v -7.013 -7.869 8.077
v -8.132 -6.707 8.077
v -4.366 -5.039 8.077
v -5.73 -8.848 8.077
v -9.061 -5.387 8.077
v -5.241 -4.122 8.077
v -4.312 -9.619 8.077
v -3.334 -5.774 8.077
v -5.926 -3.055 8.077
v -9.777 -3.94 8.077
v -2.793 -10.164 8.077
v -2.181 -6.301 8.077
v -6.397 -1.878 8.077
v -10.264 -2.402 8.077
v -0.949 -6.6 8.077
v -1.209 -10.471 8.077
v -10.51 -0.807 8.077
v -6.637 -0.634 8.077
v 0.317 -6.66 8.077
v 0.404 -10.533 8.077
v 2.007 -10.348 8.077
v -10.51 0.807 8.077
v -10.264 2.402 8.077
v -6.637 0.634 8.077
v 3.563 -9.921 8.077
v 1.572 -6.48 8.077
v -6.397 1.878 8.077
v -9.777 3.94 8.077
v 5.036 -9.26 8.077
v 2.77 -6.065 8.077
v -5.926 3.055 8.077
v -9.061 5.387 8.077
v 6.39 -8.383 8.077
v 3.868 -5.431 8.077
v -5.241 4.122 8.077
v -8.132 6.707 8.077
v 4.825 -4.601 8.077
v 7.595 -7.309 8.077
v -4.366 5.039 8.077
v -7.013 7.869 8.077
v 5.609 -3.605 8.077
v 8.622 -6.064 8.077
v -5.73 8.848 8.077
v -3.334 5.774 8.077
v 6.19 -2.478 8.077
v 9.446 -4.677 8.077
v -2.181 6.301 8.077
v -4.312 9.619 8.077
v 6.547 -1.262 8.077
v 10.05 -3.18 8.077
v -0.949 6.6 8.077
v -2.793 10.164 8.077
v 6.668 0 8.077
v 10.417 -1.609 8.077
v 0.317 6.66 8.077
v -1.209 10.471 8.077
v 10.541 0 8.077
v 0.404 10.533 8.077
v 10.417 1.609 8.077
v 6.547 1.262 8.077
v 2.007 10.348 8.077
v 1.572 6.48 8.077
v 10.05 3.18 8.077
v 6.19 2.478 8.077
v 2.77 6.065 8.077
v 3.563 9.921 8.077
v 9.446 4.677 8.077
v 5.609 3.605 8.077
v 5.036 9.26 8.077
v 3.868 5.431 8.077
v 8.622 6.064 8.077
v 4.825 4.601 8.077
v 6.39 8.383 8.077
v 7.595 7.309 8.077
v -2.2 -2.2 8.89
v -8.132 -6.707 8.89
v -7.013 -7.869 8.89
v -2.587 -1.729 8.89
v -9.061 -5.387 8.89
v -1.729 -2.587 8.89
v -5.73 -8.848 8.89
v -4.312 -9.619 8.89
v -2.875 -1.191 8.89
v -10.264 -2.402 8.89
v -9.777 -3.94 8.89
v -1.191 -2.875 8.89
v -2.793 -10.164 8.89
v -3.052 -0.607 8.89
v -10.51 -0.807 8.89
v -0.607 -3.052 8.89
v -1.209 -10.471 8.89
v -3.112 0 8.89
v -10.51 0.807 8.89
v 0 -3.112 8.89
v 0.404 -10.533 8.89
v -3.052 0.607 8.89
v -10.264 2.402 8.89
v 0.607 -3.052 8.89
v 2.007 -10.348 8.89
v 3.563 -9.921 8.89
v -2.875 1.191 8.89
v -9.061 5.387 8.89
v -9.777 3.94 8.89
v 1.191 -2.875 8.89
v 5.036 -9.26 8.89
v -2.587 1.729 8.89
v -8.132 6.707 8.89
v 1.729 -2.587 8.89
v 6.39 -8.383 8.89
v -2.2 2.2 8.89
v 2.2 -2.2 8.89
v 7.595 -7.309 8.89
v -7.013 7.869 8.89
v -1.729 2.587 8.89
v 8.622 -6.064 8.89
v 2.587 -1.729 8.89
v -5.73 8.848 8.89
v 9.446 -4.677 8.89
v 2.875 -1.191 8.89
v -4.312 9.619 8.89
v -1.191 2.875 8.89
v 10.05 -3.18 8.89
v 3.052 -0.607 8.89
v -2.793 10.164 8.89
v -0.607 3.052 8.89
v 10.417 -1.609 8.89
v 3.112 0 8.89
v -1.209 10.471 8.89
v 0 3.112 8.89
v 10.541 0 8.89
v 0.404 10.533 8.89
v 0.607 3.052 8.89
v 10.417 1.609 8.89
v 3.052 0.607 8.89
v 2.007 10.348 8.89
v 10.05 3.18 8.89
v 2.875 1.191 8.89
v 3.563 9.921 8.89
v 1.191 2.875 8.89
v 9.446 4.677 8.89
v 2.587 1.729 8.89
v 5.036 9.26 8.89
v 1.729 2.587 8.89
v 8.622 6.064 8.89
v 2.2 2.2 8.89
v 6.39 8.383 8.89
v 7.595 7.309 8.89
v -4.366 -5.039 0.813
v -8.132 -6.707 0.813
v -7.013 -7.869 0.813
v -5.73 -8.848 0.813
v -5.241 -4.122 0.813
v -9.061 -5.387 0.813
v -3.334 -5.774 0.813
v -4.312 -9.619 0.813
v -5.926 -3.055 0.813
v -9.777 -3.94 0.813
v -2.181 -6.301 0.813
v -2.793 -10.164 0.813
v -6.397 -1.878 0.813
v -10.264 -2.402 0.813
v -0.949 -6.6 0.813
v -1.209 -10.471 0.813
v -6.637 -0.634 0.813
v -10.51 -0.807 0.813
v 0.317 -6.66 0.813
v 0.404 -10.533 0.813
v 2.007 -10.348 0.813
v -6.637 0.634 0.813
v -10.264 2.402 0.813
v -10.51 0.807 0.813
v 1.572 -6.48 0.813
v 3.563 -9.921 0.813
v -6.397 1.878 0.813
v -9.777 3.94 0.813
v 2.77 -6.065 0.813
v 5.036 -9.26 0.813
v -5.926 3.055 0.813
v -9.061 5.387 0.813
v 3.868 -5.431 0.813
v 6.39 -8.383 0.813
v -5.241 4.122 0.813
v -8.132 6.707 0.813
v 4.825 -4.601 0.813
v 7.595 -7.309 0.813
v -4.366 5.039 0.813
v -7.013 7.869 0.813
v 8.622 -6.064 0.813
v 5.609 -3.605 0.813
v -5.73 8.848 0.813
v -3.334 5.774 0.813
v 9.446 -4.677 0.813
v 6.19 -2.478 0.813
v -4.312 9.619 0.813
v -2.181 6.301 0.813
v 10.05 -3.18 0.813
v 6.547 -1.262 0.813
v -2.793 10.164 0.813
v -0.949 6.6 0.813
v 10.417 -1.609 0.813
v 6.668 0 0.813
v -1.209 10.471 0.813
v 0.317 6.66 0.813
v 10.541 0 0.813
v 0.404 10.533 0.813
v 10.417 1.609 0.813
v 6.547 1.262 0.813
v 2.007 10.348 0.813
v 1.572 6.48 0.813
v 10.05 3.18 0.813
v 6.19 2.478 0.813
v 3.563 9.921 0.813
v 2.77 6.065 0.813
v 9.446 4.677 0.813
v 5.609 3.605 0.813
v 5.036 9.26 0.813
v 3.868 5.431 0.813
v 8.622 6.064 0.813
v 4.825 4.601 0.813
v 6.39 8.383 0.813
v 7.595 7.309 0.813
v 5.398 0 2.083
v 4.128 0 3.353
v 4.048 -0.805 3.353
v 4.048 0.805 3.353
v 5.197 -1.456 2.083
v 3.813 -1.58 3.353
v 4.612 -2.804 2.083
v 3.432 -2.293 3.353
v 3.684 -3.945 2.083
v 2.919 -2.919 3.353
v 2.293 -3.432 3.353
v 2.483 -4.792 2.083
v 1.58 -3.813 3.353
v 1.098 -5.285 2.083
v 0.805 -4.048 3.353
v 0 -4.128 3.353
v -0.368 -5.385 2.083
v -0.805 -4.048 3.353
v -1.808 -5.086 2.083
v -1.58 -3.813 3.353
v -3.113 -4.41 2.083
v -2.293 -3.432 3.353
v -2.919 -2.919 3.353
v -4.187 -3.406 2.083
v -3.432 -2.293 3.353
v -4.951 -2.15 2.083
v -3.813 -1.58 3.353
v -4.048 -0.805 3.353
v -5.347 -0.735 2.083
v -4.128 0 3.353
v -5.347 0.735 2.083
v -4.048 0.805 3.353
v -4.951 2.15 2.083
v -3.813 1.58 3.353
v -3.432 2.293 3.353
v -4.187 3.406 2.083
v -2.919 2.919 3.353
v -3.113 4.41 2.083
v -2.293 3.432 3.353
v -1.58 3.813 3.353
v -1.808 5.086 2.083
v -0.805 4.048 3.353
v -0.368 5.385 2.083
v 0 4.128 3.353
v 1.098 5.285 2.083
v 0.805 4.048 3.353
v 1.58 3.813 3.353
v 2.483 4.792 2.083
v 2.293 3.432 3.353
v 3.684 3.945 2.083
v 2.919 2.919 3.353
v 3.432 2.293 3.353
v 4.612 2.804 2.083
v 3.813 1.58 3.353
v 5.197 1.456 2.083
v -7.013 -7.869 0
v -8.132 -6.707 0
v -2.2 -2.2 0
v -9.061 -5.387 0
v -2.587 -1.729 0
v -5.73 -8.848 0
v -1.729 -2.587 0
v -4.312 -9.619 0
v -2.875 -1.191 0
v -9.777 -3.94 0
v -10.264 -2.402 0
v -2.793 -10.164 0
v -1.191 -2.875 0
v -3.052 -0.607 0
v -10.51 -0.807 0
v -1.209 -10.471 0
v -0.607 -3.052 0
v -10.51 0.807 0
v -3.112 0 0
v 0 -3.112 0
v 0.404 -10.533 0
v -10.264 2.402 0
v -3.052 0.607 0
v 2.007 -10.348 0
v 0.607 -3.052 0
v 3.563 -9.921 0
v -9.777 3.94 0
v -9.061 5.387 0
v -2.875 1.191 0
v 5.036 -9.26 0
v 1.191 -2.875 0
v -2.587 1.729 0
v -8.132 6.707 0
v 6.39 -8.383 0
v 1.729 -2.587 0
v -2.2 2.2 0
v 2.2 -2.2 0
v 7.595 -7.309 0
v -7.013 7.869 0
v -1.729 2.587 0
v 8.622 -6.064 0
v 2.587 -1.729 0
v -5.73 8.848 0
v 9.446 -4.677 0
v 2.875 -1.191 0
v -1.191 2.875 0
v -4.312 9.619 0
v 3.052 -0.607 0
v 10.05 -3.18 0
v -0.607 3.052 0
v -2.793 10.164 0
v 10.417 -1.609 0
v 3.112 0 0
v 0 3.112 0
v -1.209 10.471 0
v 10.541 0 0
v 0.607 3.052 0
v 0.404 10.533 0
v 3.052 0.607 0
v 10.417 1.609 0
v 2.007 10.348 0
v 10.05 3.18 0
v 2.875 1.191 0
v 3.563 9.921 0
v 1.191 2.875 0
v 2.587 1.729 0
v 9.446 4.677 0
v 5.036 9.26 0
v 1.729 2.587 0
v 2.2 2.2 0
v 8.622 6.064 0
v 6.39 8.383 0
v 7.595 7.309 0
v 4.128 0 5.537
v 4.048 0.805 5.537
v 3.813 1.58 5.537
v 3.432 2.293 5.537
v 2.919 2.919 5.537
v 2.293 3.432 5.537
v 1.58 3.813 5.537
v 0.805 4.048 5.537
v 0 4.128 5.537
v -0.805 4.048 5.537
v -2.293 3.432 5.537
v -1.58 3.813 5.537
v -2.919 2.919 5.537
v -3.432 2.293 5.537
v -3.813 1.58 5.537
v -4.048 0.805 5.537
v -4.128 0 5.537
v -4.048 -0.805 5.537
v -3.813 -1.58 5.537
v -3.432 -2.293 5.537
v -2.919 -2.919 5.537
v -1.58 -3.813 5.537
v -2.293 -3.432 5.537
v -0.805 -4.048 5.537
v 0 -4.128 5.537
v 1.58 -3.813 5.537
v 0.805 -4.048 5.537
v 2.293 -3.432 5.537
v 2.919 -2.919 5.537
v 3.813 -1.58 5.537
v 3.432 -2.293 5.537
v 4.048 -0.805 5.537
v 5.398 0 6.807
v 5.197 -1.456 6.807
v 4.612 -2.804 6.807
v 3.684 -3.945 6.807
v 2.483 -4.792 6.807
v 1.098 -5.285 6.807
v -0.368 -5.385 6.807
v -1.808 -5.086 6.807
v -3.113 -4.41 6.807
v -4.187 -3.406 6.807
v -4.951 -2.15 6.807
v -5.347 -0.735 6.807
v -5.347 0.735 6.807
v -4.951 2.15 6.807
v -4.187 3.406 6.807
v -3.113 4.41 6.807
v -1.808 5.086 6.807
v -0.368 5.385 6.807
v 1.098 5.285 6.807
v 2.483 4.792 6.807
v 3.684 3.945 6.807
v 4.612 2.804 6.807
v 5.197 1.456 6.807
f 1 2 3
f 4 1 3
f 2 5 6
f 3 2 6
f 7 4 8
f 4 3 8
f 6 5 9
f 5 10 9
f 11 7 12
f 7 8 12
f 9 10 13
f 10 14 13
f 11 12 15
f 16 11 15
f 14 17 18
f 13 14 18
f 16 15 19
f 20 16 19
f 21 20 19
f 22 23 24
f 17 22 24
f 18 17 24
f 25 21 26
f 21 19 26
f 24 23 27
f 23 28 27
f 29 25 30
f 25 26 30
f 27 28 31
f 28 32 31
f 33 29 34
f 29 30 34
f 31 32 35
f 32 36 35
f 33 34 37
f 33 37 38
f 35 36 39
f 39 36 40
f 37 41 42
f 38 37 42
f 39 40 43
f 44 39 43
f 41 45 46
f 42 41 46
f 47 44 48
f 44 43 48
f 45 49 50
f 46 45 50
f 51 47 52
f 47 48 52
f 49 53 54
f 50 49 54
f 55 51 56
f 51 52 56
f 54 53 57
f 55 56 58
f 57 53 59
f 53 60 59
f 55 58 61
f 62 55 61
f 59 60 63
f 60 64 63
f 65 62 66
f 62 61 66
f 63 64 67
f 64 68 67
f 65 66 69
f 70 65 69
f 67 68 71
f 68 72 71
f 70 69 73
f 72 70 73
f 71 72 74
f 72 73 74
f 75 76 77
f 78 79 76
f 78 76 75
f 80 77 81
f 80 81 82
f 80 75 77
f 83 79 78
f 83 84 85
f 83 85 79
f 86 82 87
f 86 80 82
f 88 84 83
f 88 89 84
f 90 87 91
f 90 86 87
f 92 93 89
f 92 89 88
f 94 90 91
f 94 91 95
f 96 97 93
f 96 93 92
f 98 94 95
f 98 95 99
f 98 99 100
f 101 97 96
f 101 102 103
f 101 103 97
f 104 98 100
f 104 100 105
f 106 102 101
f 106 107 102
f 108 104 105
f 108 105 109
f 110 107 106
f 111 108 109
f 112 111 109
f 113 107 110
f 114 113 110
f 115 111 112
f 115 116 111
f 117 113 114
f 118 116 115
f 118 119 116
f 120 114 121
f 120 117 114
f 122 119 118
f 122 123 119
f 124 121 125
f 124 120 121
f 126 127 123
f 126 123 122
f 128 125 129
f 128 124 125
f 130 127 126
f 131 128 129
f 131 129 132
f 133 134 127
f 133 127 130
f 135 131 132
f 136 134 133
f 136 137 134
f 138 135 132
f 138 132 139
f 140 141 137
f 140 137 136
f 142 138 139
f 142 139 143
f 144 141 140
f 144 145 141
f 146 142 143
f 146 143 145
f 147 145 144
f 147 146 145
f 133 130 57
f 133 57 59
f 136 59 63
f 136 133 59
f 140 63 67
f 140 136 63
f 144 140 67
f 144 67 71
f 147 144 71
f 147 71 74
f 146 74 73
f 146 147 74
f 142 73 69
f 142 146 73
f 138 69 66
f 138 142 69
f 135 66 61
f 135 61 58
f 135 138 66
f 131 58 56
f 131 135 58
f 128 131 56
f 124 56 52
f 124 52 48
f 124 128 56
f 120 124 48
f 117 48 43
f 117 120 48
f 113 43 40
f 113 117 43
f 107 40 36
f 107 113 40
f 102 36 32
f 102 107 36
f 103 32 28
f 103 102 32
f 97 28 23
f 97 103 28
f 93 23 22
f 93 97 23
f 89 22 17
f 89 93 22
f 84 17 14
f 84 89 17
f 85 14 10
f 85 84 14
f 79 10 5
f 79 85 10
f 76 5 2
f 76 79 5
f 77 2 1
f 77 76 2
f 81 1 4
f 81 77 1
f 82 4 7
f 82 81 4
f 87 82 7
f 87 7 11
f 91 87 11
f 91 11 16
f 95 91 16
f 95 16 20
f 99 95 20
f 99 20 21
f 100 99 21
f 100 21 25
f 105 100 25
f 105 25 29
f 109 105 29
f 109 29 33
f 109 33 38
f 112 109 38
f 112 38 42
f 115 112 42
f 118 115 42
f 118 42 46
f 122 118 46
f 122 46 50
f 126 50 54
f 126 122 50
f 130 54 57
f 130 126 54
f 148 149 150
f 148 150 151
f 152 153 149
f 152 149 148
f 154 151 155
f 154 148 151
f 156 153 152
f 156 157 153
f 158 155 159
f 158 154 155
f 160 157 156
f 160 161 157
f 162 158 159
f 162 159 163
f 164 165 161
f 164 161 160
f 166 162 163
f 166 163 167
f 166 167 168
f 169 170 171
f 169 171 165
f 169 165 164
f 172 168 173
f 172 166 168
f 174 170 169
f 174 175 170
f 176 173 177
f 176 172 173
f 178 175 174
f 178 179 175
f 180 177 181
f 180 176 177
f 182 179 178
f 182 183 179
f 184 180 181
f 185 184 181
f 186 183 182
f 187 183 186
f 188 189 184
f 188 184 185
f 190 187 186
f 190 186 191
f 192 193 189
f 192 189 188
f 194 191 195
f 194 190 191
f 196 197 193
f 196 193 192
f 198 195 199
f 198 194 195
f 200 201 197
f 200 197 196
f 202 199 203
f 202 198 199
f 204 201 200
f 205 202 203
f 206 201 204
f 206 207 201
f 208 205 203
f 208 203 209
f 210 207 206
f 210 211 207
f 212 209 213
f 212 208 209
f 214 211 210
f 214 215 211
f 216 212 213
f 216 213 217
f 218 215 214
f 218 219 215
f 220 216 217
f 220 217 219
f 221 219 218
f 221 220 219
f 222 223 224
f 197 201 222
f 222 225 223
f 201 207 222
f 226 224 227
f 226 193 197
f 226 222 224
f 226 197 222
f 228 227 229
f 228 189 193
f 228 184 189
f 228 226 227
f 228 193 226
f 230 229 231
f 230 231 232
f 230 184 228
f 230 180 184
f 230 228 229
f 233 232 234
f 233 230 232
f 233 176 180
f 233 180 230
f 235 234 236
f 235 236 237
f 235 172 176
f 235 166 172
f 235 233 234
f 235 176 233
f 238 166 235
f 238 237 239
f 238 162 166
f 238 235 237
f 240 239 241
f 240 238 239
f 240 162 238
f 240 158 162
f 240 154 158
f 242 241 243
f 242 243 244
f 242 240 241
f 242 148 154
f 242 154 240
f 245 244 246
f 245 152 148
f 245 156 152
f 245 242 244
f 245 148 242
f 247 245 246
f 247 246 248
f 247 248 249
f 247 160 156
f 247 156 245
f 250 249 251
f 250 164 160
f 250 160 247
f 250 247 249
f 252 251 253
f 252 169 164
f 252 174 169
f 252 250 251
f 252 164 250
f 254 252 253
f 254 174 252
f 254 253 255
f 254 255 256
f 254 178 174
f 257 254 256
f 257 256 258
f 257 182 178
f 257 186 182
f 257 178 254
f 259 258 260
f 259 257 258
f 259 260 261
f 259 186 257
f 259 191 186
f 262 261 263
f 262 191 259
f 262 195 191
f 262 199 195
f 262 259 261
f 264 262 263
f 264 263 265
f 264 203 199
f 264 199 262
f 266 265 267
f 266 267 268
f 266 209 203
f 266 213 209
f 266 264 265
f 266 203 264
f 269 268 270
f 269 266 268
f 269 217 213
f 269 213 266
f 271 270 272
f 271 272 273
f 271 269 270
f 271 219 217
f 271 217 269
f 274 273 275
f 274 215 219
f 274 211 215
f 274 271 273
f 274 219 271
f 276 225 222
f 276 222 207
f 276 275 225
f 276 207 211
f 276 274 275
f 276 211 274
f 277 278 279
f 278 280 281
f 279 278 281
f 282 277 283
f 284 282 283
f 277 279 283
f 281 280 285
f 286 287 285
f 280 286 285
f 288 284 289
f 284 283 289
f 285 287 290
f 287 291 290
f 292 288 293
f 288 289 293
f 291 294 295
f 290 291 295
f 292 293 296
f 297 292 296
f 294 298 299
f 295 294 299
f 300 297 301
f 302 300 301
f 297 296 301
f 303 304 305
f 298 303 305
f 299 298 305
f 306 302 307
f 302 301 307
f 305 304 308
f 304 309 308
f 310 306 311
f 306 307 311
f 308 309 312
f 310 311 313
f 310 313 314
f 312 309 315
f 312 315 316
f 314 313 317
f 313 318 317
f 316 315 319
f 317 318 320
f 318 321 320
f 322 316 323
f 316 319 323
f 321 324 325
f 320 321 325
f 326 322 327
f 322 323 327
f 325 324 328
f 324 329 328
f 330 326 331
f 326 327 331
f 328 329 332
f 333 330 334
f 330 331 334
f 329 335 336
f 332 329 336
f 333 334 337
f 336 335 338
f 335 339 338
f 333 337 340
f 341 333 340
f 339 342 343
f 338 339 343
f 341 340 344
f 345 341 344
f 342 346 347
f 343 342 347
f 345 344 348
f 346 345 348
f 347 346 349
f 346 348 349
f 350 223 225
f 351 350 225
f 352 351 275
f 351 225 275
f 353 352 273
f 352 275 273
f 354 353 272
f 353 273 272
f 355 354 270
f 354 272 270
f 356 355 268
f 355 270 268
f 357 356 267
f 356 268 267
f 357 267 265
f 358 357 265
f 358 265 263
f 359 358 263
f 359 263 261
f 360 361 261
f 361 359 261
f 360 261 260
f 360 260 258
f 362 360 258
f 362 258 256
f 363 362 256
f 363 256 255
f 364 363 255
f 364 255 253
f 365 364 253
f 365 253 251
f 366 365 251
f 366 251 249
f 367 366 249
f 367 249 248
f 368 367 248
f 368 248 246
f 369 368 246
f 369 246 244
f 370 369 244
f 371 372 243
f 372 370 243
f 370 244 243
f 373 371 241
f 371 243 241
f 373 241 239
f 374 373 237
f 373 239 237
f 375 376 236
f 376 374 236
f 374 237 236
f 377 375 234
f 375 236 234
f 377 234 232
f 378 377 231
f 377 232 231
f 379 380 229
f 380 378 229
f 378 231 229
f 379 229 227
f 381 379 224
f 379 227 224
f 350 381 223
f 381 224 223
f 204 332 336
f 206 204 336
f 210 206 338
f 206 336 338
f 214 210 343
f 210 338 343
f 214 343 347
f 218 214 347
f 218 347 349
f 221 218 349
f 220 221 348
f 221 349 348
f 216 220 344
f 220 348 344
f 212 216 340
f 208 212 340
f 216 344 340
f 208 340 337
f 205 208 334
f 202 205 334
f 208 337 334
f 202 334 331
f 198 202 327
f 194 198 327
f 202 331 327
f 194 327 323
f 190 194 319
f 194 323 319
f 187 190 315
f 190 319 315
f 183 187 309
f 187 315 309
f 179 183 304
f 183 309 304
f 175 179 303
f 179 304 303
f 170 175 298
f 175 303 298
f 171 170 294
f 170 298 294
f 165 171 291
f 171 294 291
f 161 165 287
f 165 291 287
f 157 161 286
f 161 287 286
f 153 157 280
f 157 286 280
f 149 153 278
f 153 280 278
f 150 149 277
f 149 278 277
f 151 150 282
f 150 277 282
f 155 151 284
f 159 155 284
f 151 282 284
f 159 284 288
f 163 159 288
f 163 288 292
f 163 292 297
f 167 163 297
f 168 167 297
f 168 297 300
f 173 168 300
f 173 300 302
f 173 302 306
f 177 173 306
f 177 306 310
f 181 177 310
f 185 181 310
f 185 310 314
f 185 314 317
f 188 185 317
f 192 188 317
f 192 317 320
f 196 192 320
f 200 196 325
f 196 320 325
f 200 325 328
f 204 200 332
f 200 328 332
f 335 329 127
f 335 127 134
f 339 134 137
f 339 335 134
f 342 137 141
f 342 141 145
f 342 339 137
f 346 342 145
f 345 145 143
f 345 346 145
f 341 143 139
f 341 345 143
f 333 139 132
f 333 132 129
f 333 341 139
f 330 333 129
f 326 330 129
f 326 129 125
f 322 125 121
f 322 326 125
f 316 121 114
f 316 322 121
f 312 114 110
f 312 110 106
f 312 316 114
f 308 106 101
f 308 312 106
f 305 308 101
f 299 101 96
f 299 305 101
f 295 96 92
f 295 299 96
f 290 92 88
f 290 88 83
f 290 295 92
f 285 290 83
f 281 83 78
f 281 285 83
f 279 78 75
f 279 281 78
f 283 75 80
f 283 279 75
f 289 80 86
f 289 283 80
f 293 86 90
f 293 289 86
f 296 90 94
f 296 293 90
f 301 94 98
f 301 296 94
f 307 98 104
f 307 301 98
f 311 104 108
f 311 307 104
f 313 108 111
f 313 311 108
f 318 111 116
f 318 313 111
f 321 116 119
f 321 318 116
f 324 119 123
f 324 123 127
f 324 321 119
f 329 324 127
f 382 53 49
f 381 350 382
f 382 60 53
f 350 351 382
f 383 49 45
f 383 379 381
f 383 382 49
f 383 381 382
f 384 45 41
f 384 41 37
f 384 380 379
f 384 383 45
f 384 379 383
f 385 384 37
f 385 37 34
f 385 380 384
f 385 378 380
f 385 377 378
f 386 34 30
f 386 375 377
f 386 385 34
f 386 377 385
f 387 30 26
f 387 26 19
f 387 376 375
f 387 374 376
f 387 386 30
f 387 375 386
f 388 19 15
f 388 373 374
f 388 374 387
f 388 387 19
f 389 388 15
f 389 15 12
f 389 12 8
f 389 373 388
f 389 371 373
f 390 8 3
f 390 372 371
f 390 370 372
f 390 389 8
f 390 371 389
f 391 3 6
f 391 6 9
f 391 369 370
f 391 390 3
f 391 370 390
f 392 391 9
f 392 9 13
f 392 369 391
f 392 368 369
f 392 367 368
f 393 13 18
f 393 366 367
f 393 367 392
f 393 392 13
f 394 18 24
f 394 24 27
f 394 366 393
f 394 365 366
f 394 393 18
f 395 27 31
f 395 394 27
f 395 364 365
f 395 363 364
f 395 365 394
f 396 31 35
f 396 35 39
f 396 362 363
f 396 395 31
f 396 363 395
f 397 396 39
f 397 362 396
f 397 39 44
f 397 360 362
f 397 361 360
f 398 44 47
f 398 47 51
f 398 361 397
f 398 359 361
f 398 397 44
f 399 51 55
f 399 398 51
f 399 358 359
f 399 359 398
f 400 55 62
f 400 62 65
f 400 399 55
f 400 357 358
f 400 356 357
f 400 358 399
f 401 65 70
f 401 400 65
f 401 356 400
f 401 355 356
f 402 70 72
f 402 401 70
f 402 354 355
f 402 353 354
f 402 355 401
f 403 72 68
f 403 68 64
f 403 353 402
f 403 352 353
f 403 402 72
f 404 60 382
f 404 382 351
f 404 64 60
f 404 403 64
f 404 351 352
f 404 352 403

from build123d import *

# Parameters (mm, degrees)
F0_R     = 10.541
F1_DEPTH = 0.8128
F2_R     = 4.1275
F3_DEPTH = 8.89
F5_R     = 10.541
F6_DEPTH = 0.8128
F7_R     = 3.1115
F8_DEPTH = 8.89
F9_SIZE  = 2.54


with BuildPart() as f1:
    # F0 (on Top) → F1 (new body)
    with BuildSketch(Plane.XY):
        Circle(F0_R)
    extrude(amount=F1_DEPTH)

    # F2 (on Top) → F3 (join)
    with BuildSketch(Plane.XY):
        Circle(F2_R)
    extrude(amount=F3_DEPTH)

    # F5 (on offset) → F6 (join)
    with BuildSketch(Plane.XY.offset(8.89)):
        Circle(F5_R)
    extrude(amount=-F6_DEPTH)

    # F7 (on Top) → F8 (cut)
    with BuildSketch(Plane.XY):
        Circle(F7_R)
    extrude(amount=F8_DEPTH, mode=Mode.SUBTRACT)

    # F9
    f9_edges = [f1.edges().sort_by_distance(p)[0] for p in [
        (-4.1275, 0, 8.0772),
        (-4.1275, 0, 0.8128),
    ]]
    chamfer(f9_edges, length=F9_SIZE)


solid = f1.part
